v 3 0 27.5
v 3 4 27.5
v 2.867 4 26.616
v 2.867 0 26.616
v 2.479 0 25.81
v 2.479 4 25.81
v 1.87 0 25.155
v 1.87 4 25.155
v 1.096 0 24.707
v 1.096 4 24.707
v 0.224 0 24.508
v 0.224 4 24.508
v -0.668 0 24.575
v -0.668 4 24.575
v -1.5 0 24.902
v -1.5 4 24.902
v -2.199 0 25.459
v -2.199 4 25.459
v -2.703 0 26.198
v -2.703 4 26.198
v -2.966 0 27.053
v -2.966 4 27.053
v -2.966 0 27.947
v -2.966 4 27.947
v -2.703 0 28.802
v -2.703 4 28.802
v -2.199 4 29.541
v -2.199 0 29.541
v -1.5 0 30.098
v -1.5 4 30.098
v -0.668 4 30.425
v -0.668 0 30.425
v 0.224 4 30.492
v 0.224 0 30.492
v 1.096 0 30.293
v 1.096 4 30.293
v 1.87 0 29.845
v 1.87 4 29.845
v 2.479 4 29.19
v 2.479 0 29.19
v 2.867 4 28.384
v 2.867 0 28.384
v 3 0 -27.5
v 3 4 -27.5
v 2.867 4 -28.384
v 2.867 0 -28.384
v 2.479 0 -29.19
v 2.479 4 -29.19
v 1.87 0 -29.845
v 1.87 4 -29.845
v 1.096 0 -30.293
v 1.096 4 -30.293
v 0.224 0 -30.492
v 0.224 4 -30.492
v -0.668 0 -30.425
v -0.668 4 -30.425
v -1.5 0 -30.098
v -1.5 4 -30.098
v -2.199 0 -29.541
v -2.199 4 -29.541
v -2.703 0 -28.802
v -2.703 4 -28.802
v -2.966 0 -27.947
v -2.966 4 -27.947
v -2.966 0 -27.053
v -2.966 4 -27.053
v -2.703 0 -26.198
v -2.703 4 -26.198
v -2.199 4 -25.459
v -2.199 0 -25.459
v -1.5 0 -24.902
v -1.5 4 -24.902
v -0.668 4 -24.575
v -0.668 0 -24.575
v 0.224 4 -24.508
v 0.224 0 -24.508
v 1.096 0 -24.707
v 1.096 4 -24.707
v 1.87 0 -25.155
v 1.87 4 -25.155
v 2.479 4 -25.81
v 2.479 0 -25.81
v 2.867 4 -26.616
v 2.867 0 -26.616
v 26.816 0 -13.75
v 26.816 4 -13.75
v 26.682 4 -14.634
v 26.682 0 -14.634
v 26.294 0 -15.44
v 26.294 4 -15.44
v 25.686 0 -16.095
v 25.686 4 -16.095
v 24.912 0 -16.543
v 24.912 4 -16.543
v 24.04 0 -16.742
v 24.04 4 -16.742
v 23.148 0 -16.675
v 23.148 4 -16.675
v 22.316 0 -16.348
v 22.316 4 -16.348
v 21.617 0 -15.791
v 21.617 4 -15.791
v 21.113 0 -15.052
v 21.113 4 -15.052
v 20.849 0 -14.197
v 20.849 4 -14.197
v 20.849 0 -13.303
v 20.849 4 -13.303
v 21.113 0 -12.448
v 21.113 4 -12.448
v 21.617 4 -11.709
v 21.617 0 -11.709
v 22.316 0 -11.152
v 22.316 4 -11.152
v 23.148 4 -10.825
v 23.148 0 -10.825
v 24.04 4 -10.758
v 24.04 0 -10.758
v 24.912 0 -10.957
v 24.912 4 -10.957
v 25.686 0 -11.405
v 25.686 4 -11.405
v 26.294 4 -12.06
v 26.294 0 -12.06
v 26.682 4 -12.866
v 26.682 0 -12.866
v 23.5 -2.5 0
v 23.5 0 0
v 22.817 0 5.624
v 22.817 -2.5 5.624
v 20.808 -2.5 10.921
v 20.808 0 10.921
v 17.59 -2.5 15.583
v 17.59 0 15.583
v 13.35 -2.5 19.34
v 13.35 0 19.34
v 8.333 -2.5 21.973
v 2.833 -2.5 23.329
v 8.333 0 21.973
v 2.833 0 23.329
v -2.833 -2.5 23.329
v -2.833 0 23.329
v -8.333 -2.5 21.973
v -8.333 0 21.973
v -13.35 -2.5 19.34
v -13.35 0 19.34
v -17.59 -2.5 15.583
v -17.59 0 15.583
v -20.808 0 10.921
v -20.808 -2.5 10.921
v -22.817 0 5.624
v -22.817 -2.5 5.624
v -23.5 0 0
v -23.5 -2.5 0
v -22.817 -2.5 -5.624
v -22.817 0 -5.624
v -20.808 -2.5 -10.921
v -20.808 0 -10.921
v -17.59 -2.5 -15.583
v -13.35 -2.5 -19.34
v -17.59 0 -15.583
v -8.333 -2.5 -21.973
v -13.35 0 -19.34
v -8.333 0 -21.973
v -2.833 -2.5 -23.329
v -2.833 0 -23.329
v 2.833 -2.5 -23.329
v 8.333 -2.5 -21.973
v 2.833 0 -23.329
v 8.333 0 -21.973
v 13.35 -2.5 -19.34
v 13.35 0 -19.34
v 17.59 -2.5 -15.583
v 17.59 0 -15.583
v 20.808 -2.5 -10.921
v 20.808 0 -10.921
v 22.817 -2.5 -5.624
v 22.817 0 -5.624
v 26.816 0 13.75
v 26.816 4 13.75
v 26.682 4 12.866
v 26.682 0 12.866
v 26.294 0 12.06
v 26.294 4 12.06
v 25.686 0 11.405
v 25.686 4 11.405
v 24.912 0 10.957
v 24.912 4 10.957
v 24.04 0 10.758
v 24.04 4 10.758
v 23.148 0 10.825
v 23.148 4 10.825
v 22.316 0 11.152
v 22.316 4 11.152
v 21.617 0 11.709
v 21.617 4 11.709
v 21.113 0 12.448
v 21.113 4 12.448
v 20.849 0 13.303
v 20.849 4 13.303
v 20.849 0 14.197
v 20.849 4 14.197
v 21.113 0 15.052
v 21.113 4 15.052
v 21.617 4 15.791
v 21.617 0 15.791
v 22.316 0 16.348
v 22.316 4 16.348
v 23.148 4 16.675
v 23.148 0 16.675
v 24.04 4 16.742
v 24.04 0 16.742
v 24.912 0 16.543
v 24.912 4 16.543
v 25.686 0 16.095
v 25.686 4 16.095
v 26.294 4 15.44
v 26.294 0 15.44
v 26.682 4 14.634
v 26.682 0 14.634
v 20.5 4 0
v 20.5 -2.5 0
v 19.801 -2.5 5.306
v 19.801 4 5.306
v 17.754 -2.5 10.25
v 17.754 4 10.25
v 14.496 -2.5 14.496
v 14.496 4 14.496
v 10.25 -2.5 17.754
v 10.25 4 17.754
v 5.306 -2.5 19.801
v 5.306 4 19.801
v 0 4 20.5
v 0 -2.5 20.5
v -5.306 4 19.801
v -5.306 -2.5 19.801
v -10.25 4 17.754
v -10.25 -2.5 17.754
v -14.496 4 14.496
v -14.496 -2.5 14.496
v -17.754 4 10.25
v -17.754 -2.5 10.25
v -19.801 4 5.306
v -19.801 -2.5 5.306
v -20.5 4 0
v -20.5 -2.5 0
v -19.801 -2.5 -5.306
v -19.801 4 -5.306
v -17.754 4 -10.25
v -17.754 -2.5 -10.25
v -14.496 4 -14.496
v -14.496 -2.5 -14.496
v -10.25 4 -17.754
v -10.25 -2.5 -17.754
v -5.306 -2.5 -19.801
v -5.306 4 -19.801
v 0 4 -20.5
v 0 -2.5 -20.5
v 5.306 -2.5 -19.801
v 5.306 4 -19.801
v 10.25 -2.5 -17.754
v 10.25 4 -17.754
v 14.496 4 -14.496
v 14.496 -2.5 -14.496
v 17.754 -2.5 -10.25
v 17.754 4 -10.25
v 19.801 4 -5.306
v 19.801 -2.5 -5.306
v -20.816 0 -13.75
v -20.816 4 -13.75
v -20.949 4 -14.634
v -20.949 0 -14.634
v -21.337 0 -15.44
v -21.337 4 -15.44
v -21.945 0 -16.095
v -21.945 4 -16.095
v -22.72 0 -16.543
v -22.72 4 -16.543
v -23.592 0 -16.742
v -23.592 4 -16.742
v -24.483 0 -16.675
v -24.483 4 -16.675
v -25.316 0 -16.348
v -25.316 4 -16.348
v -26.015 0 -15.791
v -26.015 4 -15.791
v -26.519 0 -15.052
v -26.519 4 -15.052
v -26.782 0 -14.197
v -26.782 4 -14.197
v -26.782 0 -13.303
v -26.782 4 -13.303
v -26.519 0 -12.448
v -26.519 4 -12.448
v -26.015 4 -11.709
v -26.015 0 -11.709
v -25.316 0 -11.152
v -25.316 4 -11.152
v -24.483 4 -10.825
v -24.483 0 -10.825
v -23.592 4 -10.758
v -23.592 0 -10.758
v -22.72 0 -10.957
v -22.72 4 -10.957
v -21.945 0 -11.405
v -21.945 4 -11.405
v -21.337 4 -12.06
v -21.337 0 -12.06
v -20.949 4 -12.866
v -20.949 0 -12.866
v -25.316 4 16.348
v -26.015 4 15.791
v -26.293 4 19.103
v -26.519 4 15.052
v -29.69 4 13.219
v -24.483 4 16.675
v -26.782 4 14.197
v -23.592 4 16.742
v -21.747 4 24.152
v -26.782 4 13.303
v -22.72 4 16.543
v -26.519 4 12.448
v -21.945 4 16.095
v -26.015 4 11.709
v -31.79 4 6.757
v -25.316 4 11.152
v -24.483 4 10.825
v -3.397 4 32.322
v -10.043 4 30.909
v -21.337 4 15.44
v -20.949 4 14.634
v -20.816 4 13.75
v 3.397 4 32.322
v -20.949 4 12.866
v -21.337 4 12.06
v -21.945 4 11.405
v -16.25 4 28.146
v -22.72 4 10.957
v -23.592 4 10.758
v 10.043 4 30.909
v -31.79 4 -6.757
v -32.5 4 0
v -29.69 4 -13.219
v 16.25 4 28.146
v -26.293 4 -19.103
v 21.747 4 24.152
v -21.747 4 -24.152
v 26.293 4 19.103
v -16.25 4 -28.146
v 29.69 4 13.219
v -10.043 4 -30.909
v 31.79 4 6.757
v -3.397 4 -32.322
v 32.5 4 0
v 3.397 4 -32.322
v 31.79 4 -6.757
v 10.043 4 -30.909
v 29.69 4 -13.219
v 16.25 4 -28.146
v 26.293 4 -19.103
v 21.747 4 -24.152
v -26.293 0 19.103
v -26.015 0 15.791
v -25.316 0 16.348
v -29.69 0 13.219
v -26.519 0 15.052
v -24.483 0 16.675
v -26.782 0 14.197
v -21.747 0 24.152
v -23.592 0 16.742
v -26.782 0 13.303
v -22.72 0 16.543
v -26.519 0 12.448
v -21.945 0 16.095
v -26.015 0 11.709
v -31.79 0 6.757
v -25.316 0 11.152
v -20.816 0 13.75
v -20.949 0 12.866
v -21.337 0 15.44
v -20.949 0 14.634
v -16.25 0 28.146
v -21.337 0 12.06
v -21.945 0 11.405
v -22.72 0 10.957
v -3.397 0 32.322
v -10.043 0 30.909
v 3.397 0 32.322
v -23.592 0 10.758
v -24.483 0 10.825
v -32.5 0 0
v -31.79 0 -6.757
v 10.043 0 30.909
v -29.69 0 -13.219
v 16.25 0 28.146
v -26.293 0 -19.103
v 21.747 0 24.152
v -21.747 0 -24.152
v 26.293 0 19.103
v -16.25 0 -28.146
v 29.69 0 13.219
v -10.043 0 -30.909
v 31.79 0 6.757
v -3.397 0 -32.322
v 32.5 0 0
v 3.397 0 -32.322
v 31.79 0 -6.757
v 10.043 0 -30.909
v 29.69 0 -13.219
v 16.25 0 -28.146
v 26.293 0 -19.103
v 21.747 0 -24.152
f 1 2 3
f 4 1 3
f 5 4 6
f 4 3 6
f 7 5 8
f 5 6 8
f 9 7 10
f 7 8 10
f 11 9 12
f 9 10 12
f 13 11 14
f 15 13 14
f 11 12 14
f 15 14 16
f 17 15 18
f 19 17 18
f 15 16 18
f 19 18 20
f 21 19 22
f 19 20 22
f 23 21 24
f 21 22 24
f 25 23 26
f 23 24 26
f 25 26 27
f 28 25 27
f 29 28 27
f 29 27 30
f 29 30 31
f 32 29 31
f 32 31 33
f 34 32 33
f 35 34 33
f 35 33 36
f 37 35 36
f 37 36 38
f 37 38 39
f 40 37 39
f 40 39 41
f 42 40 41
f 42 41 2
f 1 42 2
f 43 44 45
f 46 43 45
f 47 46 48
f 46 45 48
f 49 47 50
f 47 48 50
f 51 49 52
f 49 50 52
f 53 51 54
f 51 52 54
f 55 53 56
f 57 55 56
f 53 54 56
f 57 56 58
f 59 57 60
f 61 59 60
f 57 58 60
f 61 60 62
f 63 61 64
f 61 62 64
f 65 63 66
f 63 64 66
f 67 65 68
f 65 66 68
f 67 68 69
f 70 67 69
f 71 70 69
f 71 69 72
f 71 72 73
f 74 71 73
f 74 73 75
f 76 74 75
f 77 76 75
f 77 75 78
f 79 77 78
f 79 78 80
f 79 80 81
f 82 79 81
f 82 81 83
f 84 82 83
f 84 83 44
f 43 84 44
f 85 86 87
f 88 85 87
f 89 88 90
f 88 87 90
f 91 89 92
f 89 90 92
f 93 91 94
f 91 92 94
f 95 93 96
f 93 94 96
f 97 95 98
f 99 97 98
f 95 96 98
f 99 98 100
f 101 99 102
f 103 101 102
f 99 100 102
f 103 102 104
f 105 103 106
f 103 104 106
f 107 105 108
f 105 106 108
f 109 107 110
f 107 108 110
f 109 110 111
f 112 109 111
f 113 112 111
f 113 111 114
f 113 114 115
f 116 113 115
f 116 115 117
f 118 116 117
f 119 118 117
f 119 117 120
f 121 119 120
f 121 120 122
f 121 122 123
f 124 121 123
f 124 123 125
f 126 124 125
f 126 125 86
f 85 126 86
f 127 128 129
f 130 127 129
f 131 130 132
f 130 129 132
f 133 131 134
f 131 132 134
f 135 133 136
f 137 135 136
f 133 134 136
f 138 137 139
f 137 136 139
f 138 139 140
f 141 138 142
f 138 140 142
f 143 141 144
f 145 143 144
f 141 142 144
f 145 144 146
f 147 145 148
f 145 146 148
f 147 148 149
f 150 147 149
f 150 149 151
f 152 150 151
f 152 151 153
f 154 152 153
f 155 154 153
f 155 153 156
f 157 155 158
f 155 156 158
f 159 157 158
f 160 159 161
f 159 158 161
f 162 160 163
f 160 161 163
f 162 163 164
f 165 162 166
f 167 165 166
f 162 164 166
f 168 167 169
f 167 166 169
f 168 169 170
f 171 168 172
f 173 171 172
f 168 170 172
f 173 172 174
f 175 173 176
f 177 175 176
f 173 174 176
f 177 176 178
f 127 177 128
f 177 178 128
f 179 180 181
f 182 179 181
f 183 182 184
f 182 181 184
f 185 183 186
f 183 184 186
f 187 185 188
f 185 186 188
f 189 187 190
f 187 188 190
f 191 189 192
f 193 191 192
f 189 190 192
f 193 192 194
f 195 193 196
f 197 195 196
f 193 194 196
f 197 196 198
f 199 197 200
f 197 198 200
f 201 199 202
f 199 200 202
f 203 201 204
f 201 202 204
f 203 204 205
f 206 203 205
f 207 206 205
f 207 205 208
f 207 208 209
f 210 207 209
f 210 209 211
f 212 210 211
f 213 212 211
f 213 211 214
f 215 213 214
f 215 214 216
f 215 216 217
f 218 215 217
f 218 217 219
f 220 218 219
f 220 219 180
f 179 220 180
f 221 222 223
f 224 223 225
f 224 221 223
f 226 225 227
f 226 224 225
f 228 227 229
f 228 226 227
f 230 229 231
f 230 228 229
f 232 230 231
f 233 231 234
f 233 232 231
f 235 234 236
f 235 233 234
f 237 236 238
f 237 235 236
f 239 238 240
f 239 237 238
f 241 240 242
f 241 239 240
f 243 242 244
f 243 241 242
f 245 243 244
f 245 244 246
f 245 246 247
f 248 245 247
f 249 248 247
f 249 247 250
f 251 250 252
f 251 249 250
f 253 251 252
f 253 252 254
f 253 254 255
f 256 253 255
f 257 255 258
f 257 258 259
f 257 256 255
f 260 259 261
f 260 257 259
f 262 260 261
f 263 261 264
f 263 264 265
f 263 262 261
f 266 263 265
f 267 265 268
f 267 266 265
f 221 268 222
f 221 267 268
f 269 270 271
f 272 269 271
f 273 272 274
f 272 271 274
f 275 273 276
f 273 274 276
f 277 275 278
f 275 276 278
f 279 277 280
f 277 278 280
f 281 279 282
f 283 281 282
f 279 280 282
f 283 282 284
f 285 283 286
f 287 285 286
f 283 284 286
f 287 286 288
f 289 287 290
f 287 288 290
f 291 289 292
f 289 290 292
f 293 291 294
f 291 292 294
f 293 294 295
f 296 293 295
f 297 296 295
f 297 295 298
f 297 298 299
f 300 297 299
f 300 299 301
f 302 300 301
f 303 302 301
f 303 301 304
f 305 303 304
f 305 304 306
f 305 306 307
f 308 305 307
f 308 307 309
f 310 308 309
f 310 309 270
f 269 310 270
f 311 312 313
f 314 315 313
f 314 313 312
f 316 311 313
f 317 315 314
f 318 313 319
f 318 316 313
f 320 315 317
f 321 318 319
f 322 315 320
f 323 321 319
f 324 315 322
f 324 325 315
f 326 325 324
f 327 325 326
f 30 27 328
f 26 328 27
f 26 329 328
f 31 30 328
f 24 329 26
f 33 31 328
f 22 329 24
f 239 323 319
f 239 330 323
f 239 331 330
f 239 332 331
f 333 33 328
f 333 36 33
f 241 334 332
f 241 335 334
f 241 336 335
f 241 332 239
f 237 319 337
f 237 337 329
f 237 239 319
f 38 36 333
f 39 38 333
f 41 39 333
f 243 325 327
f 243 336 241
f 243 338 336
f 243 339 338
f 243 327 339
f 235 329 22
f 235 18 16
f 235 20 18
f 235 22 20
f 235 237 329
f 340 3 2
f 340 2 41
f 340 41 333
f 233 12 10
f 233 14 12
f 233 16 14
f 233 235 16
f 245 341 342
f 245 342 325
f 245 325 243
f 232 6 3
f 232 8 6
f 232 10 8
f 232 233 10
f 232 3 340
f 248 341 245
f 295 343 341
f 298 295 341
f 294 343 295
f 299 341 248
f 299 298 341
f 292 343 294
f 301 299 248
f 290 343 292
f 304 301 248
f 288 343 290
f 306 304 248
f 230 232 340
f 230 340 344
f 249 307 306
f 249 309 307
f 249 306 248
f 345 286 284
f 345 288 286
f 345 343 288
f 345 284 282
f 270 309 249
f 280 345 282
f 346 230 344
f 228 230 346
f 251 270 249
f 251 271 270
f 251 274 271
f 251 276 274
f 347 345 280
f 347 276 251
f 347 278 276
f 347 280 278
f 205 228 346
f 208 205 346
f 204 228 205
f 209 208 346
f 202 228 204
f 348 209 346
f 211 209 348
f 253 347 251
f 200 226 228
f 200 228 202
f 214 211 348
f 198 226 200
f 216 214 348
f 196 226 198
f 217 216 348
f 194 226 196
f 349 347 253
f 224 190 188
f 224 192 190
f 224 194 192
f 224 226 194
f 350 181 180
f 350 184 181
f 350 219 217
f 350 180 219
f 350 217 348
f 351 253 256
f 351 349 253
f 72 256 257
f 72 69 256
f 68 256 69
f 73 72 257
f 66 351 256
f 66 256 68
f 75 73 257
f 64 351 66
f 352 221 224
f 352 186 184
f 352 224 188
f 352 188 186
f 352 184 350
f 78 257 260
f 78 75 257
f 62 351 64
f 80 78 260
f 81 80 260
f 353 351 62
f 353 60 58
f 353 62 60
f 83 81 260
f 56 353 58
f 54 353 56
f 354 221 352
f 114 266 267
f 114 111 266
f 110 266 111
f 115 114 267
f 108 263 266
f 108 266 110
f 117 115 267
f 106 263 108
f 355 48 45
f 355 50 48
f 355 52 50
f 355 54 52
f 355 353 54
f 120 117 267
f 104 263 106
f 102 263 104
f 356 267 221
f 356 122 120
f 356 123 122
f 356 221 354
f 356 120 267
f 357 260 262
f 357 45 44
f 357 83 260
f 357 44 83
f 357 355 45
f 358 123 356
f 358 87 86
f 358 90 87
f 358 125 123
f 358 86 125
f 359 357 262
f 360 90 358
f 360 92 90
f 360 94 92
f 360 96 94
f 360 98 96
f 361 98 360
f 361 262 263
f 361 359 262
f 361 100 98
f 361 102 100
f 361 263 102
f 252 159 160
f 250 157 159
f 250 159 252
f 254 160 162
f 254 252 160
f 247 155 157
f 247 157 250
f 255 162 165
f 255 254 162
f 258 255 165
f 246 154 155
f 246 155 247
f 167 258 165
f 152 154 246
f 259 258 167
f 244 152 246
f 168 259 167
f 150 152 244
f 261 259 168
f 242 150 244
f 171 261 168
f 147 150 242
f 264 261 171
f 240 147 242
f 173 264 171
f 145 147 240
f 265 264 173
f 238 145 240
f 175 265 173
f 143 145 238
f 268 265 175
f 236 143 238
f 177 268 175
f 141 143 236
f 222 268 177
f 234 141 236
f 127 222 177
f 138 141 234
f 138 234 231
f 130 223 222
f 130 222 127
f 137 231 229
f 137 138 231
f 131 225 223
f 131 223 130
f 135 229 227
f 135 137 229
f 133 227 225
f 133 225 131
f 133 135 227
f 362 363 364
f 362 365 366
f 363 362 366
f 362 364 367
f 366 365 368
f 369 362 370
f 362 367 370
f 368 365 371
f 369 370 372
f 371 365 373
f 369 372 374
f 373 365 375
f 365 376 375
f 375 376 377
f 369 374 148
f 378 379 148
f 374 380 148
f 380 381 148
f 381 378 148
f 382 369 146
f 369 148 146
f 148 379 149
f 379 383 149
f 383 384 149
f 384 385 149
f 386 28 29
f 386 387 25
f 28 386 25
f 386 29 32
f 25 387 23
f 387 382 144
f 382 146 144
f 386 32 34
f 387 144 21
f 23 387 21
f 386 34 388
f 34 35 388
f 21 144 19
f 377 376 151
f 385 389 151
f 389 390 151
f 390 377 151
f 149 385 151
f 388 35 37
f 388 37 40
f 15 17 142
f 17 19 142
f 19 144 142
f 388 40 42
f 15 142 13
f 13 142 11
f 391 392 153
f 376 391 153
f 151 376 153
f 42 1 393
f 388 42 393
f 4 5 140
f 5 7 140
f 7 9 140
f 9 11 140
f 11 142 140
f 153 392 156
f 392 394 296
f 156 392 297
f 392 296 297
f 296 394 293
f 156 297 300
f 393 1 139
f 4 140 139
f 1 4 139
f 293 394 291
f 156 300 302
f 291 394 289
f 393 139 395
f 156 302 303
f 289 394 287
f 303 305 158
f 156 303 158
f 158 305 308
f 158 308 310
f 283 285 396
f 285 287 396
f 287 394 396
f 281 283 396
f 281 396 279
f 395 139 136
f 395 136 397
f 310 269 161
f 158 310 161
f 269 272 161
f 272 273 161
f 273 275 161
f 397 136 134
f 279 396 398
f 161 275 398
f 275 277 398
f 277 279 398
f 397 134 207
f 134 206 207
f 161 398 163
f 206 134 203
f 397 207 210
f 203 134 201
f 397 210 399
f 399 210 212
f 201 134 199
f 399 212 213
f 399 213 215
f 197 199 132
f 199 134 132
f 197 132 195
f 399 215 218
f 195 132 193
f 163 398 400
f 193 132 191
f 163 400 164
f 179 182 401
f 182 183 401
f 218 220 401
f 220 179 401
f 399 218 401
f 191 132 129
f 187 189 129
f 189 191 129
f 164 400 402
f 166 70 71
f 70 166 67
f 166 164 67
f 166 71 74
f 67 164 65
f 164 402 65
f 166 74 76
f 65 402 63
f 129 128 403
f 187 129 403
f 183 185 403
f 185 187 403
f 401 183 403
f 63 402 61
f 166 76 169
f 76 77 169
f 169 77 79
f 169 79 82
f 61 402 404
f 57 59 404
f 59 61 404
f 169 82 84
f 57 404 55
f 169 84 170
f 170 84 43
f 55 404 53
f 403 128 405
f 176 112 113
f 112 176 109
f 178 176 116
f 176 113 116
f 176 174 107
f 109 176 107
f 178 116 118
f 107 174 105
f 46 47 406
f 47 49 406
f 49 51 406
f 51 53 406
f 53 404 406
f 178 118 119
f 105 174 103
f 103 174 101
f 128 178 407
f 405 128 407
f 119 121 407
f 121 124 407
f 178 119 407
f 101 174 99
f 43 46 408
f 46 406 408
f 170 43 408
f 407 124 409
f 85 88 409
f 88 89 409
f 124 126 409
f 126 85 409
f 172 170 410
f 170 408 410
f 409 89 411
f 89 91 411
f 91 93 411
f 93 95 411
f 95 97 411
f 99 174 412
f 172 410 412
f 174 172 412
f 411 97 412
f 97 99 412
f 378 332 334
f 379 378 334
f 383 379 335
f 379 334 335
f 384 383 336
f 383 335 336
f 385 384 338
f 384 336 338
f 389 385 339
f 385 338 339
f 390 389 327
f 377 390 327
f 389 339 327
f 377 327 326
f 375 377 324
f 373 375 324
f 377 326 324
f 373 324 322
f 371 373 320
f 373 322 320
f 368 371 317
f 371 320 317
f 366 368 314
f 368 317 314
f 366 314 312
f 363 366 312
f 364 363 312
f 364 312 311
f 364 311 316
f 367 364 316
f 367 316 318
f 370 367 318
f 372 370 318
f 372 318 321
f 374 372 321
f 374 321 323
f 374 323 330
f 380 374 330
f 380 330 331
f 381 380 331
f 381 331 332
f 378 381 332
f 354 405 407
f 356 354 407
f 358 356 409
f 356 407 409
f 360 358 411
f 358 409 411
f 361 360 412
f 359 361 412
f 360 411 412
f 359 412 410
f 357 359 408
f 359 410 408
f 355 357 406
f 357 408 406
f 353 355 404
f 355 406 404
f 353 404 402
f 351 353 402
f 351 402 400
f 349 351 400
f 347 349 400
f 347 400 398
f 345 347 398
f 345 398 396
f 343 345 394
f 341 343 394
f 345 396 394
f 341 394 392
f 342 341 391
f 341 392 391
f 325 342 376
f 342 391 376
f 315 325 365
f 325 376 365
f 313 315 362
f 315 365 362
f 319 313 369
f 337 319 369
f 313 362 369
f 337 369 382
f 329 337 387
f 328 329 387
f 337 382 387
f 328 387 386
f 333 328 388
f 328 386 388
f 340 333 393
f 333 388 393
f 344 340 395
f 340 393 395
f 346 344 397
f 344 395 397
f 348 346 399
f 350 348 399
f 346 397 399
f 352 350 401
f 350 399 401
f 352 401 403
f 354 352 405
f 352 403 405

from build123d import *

# Parameters (mm, degrees)
SKETCH1_R               = 32.5
SKETCH1_R_2             = 20.5
BOSS_EXTRUDE1_DEPTH     = 4
SKETCH2_R               = 23.5
SKETCH2_R_2             = 20.5
BOSS_EXTRUDE2_DEPTH     = 2.5
SKETCH3_R               = 3
CUT_EXTRUDE1_DEPTH      = 1
CUT_EXTRUDE1_DEPTH_BACK = 7.5


with BuildPart() as part:
    # Sketch1 → Boss-Extrude1 (new body)
    with BuildSketch(Plane(origin=(0, 0, 0), x_dir=(1, 0, 0), z_dir=(0, 1, 0))):
        Circle(SKETCH1_R)
        Circle(SKETCH1_R_2, mode=Mode.SUBTRACT)
    extrude(amount=BOSS_EXTRUDE1_DEPTH)

    # Sketch2 → Boss-Extrude2 (add)
    with BuildSketch(Plane.XZ):
        Circle(SKETCH2_R)
        Circle(SKETCH2_R_2, mode=Mode.SUBTRACT)
    extrude(amount=BOSS_EXTRUDE2_DEPTH)

    # Sketch3 → Cut-Extrude1 (cut, two sides)
    with BuildSketch(Plane(origin=(0, 4, 0), x_dir=(1, 0, 0), z_dir=(0, 1, 0))) as cut_extrude1_sk:
        with Locations((0, 27.5)):
            Circle(SKETCH3_R)
        with Locations((23.815698604, 13.75)):
            Circle(SKETCH3_R)
        with Locations((23.815698604, -13.75)):
            Circle(SKETCH3_R)
        with Locations((0, -27.5)):
            Circle(SKETCH3_R)
        with Locations((-23.815698604, -13.75)):
            Circle(SKETCH3_R)
        with Locations((-23.815698604, 13.75)):
            Circle(SKETCH3_R)
    extrude(amount=CUT_EXTRUDE1_DEPTH, mode=Mode.SUBTRACT)
    extrude(cut_extrude1_sk.sketch, amount=-CUT_EXTRUDE1_DEPTH_BACK, mode=Mode.SUBTRACT)


solid = part.part
